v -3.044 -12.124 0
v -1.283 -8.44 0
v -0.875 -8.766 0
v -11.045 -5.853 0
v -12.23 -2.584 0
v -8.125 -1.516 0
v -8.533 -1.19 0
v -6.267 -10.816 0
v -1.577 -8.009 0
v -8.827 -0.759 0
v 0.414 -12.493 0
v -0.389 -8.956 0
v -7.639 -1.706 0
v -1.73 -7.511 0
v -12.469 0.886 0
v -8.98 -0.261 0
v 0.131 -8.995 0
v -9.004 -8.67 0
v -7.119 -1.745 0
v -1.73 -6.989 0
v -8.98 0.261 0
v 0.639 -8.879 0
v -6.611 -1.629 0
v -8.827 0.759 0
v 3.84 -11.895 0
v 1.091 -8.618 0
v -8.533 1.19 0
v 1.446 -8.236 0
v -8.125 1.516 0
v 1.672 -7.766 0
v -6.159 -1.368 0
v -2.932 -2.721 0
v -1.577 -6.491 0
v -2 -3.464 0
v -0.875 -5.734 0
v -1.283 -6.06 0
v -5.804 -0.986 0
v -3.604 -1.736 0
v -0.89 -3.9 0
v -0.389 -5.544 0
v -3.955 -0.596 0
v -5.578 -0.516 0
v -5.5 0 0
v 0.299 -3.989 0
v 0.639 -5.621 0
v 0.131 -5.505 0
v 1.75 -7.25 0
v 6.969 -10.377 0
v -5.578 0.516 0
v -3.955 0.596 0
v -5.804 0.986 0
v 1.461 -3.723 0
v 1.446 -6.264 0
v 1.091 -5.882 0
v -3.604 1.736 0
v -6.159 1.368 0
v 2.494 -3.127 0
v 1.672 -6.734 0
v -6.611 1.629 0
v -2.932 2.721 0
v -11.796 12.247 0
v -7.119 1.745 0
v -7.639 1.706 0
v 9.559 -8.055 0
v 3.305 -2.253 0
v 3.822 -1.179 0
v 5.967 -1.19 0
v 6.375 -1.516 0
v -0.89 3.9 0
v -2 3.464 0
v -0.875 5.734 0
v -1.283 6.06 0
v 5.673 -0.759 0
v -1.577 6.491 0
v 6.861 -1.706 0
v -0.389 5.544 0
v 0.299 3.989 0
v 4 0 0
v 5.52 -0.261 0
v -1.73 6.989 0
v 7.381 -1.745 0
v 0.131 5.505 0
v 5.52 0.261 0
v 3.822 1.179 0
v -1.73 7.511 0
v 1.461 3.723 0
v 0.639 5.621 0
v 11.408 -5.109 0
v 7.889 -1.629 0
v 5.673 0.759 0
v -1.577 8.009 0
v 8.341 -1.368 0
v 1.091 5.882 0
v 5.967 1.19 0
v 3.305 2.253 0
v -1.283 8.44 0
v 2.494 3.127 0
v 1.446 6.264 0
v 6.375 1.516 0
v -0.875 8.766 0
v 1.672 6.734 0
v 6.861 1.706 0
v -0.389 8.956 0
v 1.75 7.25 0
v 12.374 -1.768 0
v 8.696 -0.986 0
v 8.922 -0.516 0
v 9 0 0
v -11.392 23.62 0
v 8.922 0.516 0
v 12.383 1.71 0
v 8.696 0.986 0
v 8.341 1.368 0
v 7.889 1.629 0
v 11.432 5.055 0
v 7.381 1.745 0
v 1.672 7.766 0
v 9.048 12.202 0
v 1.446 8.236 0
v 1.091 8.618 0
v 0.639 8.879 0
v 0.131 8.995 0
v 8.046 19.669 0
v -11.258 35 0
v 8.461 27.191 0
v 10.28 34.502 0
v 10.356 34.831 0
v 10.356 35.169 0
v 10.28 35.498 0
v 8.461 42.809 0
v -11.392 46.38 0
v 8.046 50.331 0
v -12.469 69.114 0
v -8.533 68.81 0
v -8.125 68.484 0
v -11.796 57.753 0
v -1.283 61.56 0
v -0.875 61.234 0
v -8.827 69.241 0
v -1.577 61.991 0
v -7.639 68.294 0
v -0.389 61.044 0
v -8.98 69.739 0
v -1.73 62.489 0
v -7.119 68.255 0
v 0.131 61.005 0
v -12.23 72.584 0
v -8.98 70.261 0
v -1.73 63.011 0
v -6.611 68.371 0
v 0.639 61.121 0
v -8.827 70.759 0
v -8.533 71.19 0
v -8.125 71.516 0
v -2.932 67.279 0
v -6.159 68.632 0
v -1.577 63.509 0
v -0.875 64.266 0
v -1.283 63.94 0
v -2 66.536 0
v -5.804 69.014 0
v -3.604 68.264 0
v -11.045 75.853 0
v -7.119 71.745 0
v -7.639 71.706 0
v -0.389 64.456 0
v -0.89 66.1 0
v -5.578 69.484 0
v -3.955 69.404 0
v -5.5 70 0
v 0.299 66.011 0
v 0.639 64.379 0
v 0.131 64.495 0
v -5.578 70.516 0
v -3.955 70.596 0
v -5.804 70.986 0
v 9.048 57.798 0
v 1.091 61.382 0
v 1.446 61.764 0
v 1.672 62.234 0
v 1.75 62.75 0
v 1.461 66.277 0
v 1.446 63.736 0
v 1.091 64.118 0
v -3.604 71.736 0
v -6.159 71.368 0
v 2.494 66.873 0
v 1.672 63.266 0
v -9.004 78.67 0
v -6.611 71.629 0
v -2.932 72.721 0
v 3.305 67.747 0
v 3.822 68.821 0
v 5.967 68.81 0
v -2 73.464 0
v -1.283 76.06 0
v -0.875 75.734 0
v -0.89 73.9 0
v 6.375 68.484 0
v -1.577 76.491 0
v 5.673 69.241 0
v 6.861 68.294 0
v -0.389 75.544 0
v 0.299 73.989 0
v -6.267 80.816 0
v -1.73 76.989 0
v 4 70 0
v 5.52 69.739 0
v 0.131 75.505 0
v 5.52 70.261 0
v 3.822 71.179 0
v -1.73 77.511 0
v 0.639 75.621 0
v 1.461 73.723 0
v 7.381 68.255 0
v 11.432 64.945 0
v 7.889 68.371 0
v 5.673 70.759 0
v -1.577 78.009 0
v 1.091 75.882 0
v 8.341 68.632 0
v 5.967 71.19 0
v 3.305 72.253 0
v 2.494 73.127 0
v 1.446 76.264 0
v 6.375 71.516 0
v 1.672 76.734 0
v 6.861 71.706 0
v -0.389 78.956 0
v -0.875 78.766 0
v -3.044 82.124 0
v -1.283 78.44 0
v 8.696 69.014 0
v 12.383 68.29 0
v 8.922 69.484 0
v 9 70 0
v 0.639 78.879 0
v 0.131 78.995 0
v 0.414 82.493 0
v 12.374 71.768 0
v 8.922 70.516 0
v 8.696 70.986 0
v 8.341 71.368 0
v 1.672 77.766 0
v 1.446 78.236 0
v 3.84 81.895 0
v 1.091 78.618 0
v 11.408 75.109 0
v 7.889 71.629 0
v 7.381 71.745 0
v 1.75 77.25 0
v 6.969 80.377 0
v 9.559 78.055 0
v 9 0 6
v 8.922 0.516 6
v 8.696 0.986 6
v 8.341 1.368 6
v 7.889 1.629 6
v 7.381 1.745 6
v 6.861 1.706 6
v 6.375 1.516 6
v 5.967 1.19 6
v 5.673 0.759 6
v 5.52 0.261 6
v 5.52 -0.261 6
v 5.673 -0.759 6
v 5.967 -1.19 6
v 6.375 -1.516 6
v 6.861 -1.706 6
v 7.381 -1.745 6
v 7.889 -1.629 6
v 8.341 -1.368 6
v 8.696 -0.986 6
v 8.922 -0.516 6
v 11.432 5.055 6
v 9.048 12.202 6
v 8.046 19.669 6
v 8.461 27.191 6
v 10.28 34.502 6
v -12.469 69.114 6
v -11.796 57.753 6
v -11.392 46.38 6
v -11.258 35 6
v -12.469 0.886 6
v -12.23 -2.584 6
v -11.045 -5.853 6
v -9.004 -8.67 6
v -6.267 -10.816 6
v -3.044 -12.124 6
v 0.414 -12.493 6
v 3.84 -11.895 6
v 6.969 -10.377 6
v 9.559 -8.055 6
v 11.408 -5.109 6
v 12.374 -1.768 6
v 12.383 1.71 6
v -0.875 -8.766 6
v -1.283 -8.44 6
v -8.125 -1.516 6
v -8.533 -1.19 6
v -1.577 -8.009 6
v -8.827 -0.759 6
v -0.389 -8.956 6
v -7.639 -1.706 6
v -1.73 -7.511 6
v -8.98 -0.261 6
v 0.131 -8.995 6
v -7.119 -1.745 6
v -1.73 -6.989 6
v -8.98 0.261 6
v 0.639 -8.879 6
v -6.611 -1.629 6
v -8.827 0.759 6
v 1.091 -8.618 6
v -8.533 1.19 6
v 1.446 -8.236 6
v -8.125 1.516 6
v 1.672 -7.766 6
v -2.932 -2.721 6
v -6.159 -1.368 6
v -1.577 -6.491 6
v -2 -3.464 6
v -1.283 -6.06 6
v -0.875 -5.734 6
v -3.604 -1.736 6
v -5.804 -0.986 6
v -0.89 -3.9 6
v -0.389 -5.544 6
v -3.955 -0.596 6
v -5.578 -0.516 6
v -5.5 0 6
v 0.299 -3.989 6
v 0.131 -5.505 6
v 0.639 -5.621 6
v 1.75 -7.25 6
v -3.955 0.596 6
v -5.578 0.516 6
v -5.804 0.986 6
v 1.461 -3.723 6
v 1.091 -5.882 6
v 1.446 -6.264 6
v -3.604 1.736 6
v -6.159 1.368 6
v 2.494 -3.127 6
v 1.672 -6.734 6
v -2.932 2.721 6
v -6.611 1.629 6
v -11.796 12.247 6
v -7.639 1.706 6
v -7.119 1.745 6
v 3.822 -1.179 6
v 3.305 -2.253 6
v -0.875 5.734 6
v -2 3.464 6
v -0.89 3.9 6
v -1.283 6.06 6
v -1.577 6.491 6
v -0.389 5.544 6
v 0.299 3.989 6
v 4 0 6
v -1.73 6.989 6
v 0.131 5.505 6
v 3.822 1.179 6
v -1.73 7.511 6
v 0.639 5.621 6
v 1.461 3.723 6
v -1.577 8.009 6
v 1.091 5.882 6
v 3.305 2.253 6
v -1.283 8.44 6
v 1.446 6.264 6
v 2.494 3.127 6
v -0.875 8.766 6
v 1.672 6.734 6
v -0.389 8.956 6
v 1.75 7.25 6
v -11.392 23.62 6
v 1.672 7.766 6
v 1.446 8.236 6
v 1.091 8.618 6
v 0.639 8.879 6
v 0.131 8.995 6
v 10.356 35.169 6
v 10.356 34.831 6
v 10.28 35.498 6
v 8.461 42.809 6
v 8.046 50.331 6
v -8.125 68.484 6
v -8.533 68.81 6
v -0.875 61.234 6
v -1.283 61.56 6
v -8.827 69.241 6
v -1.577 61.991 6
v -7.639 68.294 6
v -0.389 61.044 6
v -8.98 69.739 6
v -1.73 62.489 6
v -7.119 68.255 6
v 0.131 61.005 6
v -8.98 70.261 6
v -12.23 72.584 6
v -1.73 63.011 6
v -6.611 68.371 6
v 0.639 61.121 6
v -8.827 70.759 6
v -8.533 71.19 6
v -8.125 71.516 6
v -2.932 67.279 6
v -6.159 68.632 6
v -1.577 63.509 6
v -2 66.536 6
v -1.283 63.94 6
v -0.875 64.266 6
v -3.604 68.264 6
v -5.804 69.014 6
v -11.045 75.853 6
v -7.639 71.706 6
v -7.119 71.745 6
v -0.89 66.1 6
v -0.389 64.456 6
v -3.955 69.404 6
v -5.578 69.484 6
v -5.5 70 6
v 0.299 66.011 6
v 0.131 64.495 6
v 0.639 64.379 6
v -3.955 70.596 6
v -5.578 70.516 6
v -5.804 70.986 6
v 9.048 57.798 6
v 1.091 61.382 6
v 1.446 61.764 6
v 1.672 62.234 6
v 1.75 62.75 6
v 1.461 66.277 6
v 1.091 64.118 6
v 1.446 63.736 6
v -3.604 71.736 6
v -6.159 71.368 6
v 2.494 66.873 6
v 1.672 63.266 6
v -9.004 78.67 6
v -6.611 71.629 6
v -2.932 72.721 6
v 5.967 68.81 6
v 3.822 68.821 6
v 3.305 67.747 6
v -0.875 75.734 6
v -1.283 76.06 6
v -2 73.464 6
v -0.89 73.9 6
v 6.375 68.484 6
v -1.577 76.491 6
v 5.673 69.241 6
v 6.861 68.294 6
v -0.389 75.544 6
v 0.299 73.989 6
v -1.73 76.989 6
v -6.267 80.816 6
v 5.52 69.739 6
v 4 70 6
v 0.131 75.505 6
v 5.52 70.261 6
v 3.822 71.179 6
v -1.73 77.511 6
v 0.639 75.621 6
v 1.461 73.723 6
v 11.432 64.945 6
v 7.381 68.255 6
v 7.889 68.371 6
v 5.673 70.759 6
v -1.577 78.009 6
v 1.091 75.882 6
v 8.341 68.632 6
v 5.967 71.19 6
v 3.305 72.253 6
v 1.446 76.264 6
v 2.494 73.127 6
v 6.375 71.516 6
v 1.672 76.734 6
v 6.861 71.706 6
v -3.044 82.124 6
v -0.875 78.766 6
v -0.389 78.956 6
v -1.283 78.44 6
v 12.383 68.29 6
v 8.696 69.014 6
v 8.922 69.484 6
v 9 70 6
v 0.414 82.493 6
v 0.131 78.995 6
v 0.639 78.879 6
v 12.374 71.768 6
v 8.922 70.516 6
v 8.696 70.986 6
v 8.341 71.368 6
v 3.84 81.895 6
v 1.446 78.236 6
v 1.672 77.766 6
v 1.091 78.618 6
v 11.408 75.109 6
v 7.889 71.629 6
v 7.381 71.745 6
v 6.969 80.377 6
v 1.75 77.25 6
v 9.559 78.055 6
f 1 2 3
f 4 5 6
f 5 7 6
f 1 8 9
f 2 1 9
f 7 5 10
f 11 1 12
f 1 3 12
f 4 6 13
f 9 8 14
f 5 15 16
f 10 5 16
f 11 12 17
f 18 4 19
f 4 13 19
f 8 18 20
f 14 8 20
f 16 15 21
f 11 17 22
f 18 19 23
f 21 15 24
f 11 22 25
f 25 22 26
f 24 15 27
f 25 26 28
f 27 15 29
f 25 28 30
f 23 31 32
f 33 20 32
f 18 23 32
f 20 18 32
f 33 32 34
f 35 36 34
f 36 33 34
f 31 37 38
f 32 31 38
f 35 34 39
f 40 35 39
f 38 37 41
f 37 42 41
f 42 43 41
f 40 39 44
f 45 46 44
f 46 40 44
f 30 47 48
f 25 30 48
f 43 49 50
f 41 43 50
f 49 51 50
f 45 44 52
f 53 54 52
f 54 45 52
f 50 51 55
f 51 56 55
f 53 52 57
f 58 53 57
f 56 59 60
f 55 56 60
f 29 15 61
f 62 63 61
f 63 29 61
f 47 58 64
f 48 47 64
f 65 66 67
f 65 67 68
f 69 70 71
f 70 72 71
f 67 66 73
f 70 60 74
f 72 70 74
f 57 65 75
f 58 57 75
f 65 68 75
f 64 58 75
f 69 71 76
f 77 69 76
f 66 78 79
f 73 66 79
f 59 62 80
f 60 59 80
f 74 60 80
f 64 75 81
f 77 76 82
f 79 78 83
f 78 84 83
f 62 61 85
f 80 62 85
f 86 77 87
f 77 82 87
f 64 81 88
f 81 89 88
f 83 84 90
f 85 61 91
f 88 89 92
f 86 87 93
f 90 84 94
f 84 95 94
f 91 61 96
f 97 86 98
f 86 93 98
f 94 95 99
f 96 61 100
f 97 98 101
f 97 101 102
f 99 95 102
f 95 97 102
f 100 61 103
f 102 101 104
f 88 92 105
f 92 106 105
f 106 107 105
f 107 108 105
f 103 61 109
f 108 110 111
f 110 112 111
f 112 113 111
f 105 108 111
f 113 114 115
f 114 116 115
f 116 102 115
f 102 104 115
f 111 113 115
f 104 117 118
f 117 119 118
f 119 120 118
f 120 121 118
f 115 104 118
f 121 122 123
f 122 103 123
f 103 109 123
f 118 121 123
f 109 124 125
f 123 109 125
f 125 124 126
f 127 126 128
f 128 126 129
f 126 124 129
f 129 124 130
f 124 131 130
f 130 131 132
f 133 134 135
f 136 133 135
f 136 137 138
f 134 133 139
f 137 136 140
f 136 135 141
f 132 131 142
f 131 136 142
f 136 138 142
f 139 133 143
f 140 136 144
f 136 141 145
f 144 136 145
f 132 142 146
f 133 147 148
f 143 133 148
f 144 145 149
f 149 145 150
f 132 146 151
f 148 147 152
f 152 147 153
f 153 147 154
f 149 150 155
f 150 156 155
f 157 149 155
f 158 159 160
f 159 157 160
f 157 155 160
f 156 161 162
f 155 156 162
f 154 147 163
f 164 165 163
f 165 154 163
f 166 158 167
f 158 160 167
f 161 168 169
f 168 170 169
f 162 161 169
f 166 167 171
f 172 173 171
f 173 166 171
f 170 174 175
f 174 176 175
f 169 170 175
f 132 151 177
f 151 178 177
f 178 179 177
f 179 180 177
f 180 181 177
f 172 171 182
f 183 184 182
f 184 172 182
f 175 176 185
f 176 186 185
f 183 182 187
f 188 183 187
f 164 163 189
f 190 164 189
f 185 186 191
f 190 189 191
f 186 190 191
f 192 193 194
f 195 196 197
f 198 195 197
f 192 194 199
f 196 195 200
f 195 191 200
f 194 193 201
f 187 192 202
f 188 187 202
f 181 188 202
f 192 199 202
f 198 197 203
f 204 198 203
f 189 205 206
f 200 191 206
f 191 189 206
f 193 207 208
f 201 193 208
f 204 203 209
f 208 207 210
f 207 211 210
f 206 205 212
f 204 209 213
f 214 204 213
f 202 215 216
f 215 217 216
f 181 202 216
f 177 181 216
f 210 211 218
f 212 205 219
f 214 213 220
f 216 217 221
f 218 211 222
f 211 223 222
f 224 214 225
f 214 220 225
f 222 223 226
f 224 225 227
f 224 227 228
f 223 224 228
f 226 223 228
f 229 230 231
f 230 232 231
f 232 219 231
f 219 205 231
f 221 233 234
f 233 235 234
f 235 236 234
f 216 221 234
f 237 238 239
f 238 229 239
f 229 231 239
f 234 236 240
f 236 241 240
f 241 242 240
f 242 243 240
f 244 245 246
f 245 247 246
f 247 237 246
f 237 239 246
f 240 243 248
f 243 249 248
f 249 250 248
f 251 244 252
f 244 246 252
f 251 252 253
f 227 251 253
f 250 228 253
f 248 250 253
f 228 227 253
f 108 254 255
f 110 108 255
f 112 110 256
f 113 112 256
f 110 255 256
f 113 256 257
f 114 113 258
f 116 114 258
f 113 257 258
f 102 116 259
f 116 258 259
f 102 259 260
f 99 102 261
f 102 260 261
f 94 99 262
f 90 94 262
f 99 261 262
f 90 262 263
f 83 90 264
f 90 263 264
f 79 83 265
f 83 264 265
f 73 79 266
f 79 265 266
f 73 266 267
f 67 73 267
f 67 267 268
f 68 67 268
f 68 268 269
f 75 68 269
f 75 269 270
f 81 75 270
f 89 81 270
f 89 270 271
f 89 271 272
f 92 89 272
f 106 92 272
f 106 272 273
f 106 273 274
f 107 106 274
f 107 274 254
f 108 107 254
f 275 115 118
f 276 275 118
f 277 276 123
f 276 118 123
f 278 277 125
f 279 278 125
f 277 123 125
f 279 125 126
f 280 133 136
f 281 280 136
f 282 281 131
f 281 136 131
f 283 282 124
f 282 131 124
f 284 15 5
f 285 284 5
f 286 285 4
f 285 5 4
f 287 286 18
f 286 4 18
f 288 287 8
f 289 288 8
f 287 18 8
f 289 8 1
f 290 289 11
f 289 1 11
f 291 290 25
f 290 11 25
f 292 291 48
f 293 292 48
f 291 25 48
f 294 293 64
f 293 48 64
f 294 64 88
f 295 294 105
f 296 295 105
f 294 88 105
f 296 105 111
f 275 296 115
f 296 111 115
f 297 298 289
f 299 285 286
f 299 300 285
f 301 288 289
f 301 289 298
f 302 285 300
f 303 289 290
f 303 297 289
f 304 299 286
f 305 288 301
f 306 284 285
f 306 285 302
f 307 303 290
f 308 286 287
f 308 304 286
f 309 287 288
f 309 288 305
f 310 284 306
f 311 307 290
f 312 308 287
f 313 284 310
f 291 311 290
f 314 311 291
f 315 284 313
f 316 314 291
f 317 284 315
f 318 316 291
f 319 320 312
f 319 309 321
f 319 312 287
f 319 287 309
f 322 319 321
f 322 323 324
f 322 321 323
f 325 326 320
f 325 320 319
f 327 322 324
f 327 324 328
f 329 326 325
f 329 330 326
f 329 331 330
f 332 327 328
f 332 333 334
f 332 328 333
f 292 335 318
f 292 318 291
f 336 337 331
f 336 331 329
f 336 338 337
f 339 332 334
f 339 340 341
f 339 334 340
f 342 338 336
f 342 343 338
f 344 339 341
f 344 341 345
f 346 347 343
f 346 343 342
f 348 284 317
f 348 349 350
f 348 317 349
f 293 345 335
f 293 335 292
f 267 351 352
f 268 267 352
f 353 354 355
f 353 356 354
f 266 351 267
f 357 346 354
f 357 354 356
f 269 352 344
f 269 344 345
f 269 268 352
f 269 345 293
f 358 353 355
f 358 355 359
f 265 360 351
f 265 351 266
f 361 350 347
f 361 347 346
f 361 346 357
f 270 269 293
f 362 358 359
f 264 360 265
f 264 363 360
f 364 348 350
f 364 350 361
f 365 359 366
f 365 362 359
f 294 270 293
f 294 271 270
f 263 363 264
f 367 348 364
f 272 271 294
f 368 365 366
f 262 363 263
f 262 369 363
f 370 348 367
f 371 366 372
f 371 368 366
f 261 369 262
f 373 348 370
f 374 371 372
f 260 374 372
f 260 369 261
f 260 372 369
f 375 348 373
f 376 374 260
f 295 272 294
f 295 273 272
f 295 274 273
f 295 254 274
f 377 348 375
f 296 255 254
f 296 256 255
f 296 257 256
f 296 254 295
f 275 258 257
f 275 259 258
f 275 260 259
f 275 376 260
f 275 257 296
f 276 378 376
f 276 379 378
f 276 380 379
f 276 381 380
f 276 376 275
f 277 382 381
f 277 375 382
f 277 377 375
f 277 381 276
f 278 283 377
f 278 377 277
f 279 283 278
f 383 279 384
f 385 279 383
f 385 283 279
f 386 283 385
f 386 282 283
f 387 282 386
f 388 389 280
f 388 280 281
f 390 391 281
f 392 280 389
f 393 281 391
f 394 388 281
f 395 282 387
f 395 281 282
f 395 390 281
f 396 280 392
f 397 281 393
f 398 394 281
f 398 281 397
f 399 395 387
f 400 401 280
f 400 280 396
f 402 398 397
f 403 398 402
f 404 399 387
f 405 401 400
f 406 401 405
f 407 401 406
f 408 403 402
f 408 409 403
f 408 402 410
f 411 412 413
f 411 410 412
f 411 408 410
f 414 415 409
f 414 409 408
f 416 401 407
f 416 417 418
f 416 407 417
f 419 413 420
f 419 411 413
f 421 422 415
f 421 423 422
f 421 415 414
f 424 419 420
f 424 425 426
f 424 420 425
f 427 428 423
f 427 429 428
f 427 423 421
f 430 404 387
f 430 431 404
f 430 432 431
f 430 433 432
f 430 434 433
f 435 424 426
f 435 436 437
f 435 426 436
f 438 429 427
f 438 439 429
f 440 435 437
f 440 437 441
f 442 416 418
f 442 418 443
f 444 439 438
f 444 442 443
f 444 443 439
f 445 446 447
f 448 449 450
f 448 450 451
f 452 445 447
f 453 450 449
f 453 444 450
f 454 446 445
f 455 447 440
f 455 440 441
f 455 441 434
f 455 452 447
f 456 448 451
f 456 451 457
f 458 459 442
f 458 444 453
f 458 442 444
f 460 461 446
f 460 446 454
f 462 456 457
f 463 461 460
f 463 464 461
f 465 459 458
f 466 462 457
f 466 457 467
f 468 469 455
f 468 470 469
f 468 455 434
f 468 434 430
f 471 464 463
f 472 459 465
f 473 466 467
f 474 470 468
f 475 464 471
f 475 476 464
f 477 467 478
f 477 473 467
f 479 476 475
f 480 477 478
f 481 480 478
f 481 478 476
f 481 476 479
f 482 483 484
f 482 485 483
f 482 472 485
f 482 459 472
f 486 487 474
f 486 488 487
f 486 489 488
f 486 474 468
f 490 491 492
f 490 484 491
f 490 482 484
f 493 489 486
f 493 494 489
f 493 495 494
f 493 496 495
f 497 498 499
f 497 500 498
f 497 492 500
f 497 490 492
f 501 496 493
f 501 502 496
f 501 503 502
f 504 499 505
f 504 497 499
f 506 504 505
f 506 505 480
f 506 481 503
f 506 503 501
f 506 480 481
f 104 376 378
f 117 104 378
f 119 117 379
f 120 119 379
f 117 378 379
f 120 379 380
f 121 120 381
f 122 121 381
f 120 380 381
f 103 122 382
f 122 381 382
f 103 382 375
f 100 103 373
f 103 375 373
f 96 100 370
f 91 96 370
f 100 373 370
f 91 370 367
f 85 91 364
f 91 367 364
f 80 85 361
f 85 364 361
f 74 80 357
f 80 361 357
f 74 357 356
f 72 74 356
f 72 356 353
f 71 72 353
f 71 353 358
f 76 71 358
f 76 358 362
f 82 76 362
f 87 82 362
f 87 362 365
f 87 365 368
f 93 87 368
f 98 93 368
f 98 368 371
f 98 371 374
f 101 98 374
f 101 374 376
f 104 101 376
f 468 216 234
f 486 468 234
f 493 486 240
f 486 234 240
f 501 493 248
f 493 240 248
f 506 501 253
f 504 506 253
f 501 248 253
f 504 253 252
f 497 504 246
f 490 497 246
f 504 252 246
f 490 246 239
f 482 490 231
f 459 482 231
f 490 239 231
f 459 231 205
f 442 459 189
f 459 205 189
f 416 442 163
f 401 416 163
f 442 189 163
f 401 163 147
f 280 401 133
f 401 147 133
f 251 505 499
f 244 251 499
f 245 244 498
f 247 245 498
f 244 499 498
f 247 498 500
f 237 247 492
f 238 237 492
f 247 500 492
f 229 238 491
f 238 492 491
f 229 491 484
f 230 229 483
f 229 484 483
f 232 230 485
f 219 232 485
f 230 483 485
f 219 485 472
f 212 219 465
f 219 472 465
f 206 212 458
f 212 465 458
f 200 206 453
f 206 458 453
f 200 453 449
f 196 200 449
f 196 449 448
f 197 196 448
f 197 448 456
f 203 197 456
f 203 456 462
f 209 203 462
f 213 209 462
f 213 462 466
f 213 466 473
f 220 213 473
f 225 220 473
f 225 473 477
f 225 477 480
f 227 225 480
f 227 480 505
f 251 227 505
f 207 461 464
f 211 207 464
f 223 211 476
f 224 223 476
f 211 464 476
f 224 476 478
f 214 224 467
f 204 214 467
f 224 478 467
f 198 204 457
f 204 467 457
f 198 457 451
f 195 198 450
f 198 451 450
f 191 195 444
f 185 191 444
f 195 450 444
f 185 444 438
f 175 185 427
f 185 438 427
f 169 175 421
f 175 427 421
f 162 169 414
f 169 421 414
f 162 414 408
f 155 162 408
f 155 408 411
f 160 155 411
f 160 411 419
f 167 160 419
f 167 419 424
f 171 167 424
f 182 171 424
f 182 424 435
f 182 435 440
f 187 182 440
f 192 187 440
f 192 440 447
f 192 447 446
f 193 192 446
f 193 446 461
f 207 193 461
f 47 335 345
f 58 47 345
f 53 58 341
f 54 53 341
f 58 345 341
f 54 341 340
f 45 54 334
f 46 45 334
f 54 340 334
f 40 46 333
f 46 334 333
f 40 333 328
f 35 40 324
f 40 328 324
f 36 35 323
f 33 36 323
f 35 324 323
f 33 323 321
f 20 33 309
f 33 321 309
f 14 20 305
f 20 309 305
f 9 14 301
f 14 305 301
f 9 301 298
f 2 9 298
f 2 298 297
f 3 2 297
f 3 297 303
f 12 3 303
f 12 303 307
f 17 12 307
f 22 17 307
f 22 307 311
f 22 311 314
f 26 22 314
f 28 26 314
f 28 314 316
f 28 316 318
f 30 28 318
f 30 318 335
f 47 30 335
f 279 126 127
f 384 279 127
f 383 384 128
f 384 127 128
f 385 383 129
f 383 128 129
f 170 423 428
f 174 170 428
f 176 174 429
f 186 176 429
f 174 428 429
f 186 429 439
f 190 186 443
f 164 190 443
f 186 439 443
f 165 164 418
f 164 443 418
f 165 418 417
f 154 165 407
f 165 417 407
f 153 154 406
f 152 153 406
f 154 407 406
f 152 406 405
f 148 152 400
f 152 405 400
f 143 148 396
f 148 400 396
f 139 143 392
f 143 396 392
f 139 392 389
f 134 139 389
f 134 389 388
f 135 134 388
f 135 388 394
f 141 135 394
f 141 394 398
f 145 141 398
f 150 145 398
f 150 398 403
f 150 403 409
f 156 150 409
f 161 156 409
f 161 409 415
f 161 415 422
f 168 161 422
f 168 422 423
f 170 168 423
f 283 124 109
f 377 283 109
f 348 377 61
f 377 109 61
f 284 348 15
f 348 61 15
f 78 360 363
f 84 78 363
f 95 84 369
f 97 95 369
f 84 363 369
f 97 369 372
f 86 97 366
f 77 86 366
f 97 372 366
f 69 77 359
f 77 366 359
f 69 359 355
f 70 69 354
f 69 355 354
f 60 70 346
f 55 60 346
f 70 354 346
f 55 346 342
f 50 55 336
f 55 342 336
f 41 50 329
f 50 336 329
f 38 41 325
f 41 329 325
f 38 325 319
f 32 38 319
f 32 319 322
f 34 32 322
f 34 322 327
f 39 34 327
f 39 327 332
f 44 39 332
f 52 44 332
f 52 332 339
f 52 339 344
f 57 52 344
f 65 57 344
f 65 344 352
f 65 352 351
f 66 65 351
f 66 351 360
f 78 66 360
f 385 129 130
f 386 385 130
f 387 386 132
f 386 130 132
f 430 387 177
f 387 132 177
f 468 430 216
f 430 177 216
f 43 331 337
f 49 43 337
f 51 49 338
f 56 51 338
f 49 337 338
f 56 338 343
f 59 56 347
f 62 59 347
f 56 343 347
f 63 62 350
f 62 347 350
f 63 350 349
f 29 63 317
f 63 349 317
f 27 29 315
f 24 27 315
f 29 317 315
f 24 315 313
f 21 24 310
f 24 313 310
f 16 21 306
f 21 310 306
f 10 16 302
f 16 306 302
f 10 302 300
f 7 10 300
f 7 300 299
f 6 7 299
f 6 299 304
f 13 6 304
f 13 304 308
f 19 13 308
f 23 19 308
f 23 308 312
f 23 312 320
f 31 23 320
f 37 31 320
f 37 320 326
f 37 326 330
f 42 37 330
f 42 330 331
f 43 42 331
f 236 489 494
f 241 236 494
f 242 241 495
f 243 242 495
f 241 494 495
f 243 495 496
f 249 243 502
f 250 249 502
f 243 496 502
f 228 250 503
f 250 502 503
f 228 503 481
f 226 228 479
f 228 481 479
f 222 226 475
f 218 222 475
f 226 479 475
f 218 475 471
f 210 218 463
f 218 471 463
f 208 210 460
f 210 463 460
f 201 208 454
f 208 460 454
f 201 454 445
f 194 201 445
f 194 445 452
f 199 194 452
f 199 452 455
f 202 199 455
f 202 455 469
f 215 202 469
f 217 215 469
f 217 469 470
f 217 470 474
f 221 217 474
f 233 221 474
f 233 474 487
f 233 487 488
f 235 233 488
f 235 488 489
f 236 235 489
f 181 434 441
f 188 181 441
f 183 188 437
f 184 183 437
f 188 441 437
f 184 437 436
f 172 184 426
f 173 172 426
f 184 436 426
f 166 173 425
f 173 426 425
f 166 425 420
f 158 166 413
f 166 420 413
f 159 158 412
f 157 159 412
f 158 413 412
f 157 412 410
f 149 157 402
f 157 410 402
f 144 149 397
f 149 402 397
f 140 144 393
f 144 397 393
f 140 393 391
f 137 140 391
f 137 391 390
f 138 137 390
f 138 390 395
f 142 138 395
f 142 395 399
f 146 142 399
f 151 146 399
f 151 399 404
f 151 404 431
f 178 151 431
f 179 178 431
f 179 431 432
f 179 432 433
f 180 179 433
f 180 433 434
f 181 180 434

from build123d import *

# Parameters (mm, degrees)
SKETCH1_R           = 12.5
SKETCH1_R_2         = 1.5
BOSS_EXTRUDE1_DEPTH = 6
SKETCH2_R           = 4
SKETCH2_R_2         = 1.75
CUT_EXTRUDE1_DEPTH  = 84.657037959


with BuildPart() as part:
    # Sketch1 → Boss-Extrude1 (new body)
    with BuildSketch(Plane.XY):
        with BuildLine():
            ThreePointArc((-12.468548805, 0.886166287), (-2.14802756, 12.314056099), (11.432131685, 5.05533037))
            ThreePointArc((11.432131685, 5.05533037), (8.045519539, 19.668908158), (10.280253267, 34.502375816))
            ThreePointArc((10.280253267, 34.502375816), (7.365201971, 34.999999986), (10.280253258, 35.497624211))
            ThreePointArc((10.280253258, 35.497624211), (8.045519539, 50.331091856), (11.432131685, 64.944669631))
            ThreePointArc((11.432131685, 64.944669631), (-2.148028371, 57.685944043), (-12.468548922, 69.113835355))
            ThreePointArc((-12.468548922, 69.113835355), (-11.560587189, 52.067656989), (-11.257806268, 35))
            ThreePointArc((-11.257806268, 35), (-11.56058716, 17.932343833), (-12.468548805, 0.886166287))
        make_face()
        with Locations((0, 70)):
            Circle(SKETCH1_R)
        with Locations((8.865201971, 35)):
            Circle(SKETCH1_R_2)
        Circle(SKETCH1_R)
    extrude(amount=BOSS_EXTRUDE1_DEPTH)

    # Sketch2 → Cut-Extrude1 (cut, through all)
    with BuildSketch(Plane.XY.offset(6)):
        with Locations((0, 70)):
            Circle(SKETCH2_R)
        Circle(SKETCH2_R)
        with Locations((0, 7.25)):
            Circle(SKETCH2_R_2)
        with Locations((7.25, 0)):
            Circle(SKETCH2_R_2)
        with Locations((0, -7.25)):
            Circle(SKETCH2_R_2)
        with Locations((-7.25, 0)):
            Circle(SKETCH2_R_2)
        with Locations((0, 77.25)):
            Circle(SKETCH2_R_2)
        with Locations((7.25, 70)):
            Circle(SKETCH2_R_2)
        with Locations((0, 62.75)):
            Circle(SKETCH2_R_2)
        with Locations((-7.25, 70)):
            Circle(SKETCH2_R_2)
    extrude(amount=-CUT_EXTRUDE1_DEPTH, mode=Mode.SUBTRACT)


solid = part.part
